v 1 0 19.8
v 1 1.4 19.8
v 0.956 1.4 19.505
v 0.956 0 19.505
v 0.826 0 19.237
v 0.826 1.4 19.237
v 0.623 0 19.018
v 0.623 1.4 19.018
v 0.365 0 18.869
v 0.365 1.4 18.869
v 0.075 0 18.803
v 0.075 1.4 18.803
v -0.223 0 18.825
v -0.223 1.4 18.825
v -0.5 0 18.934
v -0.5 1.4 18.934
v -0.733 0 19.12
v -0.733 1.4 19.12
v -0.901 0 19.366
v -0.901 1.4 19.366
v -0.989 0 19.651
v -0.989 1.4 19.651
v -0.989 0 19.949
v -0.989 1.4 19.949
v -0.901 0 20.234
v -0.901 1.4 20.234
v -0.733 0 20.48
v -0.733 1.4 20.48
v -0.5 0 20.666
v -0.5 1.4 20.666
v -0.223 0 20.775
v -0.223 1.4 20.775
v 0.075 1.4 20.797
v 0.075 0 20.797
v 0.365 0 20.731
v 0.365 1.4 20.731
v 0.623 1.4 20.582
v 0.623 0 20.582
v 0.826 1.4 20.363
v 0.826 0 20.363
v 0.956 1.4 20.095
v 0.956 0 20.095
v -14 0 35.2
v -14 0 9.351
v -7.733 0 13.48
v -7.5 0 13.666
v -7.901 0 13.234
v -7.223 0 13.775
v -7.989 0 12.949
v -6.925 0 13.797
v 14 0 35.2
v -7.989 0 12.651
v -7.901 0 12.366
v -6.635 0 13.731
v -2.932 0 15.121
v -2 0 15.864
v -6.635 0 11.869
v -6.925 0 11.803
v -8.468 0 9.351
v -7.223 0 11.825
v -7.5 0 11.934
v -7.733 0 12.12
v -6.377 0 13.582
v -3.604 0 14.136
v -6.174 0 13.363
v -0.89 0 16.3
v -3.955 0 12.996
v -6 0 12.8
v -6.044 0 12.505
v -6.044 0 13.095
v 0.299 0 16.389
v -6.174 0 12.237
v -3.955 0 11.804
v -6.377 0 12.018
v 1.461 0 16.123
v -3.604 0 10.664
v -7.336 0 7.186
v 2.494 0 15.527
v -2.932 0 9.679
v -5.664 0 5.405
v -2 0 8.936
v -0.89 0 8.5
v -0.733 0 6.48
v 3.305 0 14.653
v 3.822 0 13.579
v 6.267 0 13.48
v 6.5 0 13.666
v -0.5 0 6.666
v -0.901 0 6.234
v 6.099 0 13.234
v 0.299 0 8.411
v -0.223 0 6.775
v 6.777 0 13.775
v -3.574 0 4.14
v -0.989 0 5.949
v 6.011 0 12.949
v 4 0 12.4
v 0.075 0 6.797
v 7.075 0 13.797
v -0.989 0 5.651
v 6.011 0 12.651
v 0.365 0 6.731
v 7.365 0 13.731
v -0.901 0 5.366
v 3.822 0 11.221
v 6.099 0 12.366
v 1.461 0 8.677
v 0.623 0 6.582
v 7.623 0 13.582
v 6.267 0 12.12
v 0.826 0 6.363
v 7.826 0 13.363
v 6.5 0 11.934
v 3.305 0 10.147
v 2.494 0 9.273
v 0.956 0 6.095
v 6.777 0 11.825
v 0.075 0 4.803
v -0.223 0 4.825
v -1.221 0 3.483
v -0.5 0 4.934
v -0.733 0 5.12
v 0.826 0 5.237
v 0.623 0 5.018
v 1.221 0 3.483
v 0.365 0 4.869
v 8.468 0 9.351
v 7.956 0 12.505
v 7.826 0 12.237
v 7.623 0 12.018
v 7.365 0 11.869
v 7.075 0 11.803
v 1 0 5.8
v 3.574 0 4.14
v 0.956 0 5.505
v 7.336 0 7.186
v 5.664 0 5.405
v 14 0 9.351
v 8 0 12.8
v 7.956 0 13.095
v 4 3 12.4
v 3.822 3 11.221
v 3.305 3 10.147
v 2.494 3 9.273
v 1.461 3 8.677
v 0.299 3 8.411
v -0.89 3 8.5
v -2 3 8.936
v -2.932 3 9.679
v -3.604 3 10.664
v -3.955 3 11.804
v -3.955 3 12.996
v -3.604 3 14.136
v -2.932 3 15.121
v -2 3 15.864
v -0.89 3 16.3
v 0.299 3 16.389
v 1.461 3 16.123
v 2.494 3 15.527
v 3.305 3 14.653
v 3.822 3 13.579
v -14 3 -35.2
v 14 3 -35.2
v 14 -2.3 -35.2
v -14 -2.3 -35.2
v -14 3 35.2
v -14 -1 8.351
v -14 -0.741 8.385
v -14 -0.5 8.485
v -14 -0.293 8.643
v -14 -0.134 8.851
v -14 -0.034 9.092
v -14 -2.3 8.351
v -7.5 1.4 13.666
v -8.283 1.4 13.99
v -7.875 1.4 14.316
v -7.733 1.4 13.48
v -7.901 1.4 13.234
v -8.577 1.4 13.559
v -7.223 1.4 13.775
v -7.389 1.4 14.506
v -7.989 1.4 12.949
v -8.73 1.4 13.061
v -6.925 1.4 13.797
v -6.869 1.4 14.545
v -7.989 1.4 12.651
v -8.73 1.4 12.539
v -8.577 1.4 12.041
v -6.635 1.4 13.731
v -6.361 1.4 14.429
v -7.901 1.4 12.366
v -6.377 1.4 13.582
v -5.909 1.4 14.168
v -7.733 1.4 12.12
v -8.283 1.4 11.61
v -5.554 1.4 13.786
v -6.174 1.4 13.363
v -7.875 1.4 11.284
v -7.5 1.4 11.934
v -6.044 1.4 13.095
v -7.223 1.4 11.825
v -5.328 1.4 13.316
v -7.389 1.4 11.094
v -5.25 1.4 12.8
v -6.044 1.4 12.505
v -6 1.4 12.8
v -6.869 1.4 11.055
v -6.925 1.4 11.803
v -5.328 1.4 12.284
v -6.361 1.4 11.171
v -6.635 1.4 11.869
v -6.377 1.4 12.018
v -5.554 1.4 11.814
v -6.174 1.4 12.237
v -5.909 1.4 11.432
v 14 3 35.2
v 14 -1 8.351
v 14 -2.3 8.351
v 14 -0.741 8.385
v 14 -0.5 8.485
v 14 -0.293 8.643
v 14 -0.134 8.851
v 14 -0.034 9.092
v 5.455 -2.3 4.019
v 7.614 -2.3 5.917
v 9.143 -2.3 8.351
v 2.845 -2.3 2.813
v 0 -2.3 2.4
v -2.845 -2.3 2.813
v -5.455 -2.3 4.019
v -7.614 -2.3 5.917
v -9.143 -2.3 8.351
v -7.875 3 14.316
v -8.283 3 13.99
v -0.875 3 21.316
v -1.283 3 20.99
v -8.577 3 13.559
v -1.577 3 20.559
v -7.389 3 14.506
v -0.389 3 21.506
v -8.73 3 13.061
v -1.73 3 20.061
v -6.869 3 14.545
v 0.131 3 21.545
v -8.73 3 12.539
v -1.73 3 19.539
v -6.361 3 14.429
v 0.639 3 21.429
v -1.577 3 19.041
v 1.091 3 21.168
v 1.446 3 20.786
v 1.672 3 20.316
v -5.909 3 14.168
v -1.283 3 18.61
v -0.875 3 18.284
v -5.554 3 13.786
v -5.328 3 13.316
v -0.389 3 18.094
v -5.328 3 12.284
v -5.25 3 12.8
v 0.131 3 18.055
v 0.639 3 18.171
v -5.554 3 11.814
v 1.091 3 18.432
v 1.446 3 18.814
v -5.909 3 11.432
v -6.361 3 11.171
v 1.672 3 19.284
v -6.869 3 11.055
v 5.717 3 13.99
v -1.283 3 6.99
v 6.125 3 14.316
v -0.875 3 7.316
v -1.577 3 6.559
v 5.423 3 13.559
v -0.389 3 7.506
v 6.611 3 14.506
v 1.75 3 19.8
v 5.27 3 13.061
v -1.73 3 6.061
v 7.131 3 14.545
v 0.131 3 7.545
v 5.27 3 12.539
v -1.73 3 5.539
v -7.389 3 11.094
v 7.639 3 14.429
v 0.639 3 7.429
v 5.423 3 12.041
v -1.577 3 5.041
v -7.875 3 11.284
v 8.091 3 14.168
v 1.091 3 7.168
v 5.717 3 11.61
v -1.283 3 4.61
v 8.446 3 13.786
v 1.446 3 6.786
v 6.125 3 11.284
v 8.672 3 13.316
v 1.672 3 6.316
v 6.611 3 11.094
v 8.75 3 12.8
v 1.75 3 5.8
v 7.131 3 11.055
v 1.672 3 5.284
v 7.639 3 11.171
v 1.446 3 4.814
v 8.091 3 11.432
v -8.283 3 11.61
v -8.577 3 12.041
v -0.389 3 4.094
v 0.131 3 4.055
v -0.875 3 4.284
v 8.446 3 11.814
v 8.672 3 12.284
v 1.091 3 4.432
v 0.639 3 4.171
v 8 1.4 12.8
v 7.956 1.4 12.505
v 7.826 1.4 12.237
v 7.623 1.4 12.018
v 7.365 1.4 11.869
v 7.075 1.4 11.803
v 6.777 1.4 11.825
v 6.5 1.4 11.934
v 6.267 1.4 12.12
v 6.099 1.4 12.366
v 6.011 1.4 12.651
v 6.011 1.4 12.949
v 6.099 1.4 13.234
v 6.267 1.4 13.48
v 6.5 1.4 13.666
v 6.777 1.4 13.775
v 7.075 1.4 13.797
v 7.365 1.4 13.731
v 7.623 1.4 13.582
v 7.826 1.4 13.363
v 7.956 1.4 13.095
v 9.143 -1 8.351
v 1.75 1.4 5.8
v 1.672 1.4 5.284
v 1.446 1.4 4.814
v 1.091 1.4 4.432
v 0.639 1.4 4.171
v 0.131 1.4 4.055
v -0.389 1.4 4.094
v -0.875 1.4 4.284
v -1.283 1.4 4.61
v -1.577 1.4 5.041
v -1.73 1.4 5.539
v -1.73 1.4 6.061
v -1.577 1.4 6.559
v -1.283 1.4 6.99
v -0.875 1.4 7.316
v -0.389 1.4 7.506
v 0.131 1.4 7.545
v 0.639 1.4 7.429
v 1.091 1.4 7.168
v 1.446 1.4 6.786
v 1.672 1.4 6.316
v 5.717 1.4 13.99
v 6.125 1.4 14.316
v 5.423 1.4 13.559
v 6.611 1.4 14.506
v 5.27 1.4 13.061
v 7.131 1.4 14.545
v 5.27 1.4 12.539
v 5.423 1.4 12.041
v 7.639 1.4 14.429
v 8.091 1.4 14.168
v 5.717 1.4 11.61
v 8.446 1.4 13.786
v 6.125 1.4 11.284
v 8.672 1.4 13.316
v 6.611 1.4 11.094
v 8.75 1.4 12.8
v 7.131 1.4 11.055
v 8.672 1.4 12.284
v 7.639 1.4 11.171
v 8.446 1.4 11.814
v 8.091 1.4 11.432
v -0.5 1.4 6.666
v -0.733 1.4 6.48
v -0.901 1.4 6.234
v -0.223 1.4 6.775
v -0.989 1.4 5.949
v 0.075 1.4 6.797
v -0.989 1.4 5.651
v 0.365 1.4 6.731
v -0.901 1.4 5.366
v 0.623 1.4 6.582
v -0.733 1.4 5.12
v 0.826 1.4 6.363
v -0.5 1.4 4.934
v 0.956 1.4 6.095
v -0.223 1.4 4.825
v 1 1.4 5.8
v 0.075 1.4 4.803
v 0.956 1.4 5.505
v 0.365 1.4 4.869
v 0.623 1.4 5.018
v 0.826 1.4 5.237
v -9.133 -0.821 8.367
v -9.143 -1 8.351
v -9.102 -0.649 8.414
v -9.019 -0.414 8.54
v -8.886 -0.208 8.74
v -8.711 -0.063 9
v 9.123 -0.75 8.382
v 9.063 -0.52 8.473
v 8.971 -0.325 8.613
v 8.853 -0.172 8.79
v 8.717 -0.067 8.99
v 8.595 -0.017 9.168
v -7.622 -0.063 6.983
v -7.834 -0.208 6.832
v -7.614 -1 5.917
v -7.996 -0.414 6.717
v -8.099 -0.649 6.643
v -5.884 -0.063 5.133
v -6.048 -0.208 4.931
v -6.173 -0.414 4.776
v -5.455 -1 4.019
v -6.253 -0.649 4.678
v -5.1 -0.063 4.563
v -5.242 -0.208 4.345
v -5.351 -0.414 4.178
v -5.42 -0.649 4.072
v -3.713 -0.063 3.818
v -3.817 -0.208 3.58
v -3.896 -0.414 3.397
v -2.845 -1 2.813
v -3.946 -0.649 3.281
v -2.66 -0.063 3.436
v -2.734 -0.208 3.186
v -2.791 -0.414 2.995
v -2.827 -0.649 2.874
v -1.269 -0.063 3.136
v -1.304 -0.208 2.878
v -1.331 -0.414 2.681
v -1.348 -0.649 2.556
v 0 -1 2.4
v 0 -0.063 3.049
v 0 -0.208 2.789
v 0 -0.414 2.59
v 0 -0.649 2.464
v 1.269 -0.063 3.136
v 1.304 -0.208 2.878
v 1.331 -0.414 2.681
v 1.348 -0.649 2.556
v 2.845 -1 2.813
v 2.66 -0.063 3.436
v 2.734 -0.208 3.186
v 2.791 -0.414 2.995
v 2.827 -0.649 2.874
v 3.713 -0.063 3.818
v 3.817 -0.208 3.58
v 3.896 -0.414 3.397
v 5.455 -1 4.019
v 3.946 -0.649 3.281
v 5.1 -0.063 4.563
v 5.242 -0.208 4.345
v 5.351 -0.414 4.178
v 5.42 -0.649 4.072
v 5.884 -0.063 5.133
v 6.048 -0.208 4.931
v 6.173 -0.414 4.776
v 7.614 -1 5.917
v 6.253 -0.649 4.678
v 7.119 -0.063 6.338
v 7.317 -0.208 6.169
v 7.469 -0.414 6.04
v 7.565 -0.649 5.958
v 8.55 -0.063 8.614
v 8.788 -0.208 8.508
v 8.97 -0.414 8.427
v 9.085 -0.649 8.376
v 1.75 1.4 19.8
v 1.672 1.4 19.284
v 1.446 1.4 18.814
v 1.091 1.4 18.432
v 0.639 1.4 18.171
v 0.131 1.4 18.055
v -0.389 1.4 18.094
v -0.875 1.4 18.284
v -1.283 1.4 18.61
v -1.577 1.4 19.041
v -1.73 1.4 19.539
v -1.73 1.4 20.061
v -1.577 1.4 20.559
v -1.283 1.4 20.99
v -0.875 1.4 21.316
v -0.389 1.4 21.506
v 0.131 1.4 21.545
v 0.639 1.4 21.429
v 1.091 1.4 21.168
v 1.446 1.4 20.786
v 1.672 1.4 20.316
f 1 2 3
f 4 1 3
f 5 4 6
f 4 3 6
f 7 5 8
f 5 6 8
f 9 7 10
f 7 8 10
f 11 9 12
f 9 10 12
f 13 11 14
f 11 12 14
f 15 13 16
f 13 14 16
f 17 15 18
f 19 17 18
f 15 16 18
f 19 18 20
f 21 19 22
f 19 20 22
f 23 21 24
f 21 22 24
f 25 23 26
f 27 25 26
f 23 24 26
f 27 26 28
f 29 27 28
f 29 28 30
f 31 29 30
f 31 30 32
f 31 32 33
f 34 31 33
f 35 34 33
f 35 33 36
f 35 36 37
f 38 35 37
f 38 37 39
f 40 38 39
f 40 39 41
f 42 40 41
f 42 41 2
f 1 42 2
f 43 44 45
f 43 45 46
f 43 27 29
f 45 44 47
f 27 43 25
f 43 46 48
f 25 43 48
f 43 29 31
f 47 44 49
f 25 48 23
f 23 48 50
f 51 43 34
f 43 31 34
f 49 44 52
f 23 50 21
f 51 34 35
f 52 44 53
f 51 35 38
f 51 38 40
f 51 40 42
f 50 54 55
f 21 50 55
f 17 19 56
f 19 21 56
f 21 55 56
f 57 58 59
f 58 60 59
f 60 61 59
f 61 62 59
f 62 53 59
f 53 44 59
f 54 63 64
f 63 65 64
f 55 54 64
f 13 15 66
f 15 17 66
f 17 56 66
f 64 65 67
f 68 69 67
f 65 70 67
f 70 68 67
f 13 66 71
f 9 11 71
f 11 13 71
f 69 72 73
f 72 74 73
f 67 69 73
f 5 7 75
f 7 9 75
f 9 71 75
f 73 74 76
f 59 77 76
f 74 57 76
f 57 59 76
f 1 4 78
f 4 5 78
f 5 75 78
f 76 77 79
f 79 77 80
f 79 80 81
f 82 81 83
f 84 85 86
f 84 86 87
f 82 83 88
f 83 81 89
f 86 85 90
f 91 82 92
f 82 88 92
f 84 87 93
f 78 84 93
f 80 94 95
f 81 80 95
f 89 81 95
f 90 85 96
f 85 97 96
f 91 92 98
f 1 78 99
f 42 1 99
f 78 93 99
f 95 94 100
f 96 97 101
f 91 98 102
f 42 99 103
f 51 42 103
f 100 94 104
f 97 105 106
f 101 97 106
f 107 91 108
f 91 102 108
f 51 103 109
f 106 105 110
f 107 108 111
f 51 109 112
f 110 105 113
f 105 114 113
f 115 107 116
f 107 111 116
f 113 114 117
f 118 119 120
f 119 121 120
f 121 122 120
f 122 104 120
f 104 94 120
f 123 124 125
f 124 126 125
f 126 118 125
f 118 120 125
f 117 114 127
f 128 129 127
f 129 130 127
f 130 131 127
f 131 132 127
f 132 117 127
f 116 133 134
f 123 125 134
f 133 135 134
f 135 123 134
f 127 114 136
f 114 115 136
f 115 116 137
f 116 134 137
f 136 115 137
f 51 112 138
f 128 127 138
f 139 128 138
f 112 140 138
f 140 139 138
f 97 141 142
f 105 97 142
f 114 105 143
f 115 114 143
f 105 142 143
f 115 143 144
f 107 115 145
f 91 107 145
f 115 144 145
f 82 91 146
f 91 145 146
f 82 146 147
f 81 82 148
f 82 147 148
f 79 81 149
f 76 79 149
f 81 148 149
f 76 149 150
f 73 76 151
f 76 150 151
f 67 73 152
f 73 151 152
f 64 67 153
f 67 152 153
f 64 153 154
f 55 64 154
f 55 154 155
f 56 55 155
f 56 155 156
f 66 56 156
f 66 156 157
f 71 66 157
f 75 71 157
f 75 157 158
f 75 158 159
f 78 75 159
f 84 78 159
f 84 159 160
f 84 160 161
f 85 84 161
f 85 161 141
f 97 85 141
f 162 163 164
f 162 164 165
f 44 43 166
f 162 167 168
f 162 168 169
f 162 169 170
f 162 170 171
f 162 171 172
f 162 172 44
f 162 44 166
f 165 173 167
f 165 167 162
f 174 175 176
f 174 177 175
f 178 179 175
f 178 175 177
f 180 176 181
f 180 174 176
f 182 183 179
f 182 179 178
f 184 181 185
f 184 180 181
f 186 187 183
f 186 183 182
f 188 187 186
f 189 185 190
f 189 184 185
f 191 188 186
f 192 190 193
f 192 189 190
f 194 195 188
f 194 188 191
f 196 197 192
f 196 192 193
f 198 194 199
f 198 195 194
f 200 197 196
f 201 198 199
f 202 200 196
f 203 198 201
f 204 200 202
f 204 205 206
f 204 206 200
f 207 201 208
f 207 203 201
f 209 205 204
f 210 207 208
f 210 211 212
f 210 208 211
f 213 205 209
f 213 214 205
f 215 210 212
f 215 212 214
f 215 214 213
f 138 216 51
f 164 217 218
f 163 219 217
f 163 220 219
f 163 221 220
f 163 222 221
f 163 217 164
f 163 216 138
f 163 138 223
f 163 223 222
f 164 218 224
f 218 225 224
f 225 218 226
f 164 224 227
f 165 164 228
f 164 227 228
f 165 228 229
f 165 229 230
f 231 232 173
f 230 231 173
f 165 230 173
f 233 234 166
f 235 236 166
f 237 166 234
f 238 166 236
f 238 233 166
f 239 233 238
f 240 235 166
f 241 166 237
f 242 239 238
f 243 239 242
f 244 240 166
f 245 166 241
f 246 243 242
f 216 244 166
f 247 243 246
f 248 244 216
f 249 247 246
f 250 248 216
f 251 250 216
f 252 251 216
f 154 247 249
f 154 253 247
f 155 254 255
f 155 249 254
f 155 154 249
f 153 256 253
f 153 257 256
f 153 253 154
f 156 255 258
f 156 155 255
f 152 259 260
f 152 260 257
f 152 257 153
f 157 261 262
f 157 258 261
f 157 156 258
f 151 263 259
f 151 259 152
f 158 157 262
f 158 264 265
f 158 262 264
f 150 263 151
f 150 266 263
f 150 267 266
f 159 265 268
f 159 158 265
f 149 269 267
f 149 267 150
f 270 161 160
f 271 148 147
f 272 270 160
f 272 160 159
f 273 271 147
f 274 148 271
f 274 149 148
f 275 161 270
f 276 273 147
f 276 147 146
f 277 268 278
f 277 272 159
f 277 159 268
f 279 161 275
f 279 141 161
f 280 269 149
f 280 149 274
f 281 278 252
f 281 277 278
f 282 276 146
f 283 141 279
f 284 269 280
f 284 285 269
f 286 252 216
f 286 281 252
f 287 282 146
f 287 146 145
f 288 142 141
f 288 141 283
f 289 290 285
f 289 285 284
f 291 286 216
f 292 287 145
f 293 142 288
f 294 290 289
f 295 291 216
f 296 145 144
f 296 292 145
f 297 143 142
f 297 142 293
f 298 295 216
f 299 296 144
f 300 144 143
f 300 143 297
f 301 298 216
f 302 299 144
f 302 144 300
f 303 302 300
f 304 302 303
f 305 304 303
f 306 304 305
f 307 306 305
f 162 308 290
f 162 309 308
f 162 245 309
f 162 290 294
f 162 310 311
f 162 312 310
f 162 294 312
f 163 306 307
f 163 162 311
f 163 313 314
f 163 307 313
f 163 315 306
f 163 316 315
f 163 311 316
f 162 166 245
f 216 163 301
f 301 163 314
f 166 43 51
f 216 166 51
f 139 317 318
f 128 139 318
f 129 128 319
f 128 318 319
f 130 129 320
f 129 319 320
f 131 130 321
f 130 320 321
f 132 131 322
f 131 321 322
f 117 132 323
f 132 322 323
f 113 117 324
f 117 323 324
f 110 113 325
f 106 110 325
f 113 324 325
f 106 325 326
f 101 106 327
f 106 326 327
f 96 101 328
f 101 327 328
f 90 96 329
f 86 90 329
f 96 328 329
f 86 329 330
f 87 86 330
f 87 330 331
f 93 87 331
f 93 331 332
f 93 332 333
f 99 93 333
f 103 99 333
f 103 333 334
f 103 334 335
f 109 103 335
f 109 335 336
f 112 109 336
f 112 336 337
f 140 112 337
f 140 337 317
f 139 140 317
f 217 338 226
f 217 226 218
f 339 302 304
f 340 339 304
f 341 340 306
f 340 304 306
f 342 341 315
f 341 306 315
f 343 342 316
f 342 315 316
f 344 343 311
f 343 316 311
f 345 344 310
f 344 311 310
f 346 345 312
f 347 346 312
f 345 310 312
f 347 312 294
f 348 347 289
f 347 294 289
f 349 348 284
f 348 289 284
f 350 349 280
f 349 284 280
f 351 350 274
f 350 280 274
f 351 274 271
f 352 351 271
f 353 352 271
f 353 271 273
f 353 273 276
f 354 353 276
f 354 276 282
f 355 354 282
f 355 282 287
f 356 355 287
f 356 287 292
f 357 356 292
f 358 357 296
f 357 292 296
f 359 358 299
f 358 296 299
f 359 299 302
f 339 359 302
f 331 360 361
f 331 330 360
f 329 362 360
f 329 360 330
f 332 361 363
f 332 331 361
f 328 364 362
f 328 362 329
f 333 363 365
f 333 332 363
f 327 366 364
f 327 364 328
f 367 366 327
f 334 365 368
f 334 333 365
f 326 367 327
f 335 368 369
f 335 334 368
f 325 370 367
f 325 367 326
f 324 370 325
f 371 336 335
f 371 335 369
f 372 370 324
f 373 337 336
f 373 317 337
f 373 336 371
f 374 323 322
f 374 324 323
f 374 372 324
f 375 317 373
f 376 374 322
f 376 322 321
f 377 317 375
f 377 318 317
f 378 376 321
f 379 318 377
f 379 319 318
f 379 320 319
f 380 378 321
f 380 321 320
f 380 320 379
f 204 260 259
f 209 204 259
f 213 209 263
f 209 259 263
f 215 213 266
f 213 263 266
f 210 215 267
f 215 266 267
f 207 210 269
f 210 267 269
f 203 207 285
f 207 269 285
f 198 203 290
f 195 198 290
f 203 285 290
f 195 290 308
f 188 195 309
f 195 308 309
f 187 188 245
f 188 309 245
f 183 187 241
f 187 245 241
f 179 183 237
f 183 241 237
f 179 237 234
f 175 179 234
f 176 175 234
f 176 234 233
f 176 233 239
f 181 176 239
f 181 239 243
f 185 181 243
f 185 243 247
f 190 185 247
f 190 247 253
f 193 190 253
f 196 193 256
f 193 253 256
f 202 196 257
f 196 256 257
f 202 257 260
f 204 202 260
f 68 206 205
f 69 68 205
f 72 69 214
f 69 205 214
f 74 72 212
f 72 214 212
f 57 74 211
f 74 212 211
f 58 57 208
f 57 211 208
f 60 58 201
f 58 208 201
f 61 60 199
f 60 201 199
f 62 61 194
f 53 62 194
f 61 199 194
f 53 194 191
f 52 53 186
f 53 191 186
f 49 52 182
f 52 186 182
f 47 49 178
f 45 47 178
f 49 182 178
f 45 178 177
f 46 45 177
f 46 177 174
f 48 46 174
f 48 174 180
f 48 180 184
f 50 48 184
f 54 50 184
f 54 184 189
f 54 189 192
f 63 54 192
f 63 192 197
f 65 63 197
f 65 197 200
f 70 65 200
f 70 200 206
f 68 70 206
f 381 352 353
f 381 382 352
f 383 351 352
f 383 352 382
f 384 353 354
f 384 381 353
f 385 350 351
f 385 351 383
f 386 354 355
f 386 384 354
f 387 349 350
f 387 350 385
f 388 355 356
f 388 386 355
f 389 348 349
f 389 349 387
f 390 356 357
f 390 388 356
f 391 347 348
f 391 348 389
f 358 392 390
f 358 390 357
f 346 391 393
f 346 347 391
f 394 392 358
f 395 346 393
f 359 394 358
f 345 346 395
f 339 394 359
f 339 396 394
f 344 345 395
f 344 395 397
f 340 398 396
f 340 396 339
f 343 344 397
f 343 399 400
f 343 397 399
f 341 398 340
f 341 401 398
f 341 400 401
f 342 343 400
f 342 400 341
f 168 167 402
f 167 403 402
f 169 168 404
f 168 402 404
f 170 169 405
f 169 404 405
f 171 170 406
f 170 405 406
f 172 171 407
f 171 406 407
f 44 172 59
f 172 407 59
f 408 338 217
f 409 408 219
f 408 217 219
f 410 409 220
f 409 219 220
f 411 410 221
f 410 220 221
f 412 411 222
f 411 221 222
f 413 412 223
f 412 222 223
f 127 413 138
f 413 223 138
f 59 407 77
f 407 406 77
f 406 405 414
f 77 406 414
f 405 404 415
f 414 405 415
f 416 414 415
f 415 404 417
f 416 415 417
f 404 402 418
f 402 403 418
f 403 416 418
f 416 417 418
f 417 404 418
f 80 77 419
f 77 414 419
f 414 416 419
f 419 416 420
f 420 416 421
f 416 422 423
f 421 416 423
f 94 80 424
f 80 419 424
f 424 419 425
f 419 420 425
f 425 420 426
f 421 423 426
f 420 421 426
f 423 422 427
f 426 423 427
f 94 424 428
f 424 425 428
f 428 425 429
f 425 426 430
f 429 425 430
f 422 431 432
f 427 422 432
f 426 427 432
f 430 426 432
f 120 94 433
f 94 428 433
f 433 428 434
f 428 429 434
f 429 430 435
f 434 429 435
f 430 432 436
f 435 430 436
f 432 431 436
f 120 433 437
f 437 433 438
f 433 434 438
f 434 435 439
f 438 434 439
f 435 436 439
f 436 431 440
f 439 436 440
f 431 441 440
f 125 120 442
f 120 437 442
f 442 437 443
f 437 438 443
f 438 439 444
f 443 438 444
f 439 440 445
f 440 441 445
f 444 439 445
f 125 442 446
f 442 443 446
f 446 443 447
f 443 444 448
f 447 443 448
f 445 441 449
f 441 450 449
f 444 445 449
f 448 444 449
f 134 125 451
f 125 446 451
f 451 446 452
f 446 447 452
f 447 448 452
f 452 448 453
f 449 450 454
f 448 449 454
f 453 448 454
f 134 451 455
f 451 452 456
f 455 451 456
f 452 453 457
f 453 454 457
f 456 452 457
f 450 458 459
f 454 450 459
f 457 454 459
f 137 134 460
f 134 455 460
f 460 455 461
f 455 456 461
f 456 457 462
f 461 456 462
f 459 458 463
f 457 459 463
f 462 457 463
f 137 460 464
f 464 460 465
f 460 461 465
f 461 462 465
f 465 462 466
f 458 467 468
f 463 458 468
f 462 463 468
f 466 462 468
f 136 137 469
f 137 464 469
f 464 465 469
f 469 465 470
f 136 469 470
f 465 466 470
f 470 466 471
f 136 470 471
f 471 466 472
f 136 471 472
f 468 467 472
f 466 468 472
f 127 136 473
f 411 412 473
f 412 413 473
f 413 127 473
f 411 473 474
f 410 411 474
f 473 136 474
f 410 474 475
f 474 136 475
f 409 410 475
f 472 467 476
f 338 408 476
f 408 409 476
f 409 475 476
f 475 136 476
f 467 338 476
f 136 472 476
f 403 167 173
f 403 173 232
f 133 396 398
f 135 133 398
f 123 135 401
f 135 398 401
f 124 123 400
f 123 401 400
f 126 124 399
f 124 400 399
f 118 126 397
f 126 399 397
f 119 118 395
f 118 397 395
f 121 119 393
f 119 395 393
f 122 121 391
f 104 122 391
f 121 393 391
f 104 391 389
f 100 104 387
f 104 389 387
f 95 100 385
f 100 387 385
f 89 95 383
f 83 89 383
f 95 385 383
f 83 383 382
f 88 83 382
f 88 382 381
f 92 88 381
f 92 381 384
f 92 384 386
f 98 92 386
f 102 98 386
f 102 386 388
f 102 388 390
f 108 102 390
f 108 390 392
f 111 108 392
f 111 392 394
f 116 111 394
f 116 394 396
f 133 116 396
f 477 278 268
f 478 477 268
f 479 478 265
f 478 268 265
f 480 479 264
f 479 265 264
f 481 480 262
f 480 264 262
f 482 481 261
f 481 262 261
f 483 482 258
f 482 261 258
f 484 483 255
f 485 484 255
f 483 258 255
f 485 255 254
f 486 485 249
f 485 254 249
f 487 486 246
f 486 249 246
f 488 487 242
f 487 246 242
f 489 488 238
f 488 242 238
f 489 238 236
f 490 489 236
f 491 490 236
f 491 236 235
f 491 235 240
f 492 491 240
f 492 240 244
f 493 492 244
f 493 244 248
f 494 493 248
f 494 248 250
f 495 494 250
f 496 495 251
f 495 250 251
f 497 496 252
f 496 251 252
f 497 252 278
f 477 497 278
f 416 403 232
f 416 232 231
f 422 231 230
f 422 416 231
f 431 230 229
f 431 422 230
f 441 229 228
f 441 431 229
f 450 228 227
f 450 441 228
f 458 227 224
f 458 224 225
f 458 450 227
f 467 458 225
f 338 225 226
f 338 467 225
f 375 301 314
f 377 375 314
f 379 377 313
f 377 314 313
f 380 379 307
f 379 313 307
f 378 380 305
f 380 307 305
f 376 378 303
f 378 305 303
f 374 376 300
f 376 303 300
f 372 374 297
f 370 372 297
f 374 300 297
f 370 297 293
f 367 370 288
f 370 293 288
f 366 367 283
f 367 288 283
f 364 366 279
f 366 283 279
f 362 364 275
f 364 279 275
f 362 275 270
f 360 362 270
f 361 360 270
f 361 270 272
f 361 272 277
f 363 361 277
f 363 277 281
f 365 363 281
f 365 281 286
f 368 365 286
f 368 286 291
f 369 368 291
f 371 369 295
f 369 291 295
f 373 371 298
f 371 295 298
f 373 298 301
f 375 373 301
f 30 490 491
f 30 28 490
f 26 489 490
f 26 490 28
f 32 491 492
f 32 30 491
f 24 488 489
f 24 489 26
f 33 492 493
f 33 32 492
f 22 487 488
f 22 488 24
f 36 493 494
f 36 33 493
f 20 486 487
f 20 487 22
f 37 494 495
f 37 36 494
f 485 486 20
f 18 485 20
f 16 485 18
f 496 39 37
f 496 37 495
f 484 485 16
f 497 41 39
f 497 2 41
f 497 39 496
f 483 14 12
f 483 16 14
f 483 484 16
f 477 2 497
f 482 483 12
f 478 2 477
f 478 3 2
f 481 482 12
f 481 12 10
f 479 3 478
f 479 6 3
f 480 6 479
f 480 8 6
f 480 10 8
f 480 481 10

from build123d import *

# Parameters (mm, degrees)
SKETCH1_W           = 28
SKETCH1_H           = 70.4
BOSS_EXTRUDE1_DEPTH = 3
SKETCH4_R           = 1
CUT_EXTRUDE2_DEPTH  = 10
SKETCH5_R           = 4
CUT_EXTRUDE3_DEPTH  = 10
SKETCH10_R          = 1.75
CUT_EXTRUDE9_DEPTH  = 1.6
BOSS_EXTRUDE2_DEPTH = 2.3
FILLET1_R           = 1


with BuildPart() as part:
    # Sketch1 → Boss-Extrude1 (new body)
    with BuildSketch(Plane(origin=(0, 0, 0), x_dir=(1, 0, 0), z_dir=(0, 1, 0))):
        Rectangle(SKETCH1_W, SKETCH1_H)
    extrude(amount=BOSS_EXTRUDE1_DEPTH)

    # Sketch4 → Cut-Extrude2 (cut)
    with BuildSketch(Plane(origin=(0, 3, 0), x_dir=(1, 0, 0), z_dir=(0, 1, 0))):
        with Locations((7, -12.8)):
            Circle(SKETCH4_R)
        with Locations((0, -19.8)):
            Circle(SKETCH4_R)
        with Locations((-7, -12.8)):
            Circle(SKETCH4_R)
        with Locations((0, -5.8)):
            Circle(SKETCH4_R)
    extrude(amount=-CUT_EXTRUDE2_DEPTH, mode=Mode.SUBTRACT)

    # Sketch5 → Cut-Extrude3 (cut)
    with BuildSketch(Plane(origin=(0, 3, 0), x_dir=(1, 0, 0), z_dir=(0, 1, 0))):
        with Locations((0, -12.4)):
            Circle(SKETCH5_R)
    extrude(amount=-CUT_EXTRUDE3_DEPTH, mode=Mode.SUBTRACT)

    # Sketch10 → Cut-Extrude9 (cut)
    with BuildSketch(Plane(origin=(0, 3, 0), x_dir=(1, 0, 0), z_dir=(0, 1, 0))):
        with Locations((0, -19.8)):
            Circle(SKETCH10_R)
        with Locations((-7, -12.8)):
            Circle(SKETCH10_R)
        with Locations((0, -5.8)):
            Circle(SKETCH10_R)
        with Locations((7, -12.8)):
            Circle(SKETCH10_R)
    extrude(amount=-CUT_EXTRUDE9_DEPTH, mode=Mode.SUBTRACT)

    # Sketch11 → Boss-Extrude2 (add)
    with BuildSketch(Plane.XZ):
        with BuildLine():
            Line((9.143433638, 8.350602353), (14, 8.350602353))
            Line((14, 8.350602353), (14, -35.2))
            Line((14, -35.2), (-14, -35.2))
            Line((-14, -35.2), (-14, 8.350602353))
            Line((-14, 8.350602353), (-9.143433638, 8.350602353))
            ThreePointArc((-9.143433638, 8.350602353), (0, 2.4), (9.143433638, 8.350602353))
        make_face()
    extrude(amount=BOSS_EXTRUDE2_DEPTH)

    # Fillet1
    fillet1_edges = [part.edges().sort_by_distance(p)[0] for p in [
        (11.571716819, 0, 8.350602353),
        (0, 0, 2.4),
        (-11.571716819, 0, 8.350602353),
    ]]
    fillet(fillet1_edges, radius=FILLET1_R)


solid = part.part
